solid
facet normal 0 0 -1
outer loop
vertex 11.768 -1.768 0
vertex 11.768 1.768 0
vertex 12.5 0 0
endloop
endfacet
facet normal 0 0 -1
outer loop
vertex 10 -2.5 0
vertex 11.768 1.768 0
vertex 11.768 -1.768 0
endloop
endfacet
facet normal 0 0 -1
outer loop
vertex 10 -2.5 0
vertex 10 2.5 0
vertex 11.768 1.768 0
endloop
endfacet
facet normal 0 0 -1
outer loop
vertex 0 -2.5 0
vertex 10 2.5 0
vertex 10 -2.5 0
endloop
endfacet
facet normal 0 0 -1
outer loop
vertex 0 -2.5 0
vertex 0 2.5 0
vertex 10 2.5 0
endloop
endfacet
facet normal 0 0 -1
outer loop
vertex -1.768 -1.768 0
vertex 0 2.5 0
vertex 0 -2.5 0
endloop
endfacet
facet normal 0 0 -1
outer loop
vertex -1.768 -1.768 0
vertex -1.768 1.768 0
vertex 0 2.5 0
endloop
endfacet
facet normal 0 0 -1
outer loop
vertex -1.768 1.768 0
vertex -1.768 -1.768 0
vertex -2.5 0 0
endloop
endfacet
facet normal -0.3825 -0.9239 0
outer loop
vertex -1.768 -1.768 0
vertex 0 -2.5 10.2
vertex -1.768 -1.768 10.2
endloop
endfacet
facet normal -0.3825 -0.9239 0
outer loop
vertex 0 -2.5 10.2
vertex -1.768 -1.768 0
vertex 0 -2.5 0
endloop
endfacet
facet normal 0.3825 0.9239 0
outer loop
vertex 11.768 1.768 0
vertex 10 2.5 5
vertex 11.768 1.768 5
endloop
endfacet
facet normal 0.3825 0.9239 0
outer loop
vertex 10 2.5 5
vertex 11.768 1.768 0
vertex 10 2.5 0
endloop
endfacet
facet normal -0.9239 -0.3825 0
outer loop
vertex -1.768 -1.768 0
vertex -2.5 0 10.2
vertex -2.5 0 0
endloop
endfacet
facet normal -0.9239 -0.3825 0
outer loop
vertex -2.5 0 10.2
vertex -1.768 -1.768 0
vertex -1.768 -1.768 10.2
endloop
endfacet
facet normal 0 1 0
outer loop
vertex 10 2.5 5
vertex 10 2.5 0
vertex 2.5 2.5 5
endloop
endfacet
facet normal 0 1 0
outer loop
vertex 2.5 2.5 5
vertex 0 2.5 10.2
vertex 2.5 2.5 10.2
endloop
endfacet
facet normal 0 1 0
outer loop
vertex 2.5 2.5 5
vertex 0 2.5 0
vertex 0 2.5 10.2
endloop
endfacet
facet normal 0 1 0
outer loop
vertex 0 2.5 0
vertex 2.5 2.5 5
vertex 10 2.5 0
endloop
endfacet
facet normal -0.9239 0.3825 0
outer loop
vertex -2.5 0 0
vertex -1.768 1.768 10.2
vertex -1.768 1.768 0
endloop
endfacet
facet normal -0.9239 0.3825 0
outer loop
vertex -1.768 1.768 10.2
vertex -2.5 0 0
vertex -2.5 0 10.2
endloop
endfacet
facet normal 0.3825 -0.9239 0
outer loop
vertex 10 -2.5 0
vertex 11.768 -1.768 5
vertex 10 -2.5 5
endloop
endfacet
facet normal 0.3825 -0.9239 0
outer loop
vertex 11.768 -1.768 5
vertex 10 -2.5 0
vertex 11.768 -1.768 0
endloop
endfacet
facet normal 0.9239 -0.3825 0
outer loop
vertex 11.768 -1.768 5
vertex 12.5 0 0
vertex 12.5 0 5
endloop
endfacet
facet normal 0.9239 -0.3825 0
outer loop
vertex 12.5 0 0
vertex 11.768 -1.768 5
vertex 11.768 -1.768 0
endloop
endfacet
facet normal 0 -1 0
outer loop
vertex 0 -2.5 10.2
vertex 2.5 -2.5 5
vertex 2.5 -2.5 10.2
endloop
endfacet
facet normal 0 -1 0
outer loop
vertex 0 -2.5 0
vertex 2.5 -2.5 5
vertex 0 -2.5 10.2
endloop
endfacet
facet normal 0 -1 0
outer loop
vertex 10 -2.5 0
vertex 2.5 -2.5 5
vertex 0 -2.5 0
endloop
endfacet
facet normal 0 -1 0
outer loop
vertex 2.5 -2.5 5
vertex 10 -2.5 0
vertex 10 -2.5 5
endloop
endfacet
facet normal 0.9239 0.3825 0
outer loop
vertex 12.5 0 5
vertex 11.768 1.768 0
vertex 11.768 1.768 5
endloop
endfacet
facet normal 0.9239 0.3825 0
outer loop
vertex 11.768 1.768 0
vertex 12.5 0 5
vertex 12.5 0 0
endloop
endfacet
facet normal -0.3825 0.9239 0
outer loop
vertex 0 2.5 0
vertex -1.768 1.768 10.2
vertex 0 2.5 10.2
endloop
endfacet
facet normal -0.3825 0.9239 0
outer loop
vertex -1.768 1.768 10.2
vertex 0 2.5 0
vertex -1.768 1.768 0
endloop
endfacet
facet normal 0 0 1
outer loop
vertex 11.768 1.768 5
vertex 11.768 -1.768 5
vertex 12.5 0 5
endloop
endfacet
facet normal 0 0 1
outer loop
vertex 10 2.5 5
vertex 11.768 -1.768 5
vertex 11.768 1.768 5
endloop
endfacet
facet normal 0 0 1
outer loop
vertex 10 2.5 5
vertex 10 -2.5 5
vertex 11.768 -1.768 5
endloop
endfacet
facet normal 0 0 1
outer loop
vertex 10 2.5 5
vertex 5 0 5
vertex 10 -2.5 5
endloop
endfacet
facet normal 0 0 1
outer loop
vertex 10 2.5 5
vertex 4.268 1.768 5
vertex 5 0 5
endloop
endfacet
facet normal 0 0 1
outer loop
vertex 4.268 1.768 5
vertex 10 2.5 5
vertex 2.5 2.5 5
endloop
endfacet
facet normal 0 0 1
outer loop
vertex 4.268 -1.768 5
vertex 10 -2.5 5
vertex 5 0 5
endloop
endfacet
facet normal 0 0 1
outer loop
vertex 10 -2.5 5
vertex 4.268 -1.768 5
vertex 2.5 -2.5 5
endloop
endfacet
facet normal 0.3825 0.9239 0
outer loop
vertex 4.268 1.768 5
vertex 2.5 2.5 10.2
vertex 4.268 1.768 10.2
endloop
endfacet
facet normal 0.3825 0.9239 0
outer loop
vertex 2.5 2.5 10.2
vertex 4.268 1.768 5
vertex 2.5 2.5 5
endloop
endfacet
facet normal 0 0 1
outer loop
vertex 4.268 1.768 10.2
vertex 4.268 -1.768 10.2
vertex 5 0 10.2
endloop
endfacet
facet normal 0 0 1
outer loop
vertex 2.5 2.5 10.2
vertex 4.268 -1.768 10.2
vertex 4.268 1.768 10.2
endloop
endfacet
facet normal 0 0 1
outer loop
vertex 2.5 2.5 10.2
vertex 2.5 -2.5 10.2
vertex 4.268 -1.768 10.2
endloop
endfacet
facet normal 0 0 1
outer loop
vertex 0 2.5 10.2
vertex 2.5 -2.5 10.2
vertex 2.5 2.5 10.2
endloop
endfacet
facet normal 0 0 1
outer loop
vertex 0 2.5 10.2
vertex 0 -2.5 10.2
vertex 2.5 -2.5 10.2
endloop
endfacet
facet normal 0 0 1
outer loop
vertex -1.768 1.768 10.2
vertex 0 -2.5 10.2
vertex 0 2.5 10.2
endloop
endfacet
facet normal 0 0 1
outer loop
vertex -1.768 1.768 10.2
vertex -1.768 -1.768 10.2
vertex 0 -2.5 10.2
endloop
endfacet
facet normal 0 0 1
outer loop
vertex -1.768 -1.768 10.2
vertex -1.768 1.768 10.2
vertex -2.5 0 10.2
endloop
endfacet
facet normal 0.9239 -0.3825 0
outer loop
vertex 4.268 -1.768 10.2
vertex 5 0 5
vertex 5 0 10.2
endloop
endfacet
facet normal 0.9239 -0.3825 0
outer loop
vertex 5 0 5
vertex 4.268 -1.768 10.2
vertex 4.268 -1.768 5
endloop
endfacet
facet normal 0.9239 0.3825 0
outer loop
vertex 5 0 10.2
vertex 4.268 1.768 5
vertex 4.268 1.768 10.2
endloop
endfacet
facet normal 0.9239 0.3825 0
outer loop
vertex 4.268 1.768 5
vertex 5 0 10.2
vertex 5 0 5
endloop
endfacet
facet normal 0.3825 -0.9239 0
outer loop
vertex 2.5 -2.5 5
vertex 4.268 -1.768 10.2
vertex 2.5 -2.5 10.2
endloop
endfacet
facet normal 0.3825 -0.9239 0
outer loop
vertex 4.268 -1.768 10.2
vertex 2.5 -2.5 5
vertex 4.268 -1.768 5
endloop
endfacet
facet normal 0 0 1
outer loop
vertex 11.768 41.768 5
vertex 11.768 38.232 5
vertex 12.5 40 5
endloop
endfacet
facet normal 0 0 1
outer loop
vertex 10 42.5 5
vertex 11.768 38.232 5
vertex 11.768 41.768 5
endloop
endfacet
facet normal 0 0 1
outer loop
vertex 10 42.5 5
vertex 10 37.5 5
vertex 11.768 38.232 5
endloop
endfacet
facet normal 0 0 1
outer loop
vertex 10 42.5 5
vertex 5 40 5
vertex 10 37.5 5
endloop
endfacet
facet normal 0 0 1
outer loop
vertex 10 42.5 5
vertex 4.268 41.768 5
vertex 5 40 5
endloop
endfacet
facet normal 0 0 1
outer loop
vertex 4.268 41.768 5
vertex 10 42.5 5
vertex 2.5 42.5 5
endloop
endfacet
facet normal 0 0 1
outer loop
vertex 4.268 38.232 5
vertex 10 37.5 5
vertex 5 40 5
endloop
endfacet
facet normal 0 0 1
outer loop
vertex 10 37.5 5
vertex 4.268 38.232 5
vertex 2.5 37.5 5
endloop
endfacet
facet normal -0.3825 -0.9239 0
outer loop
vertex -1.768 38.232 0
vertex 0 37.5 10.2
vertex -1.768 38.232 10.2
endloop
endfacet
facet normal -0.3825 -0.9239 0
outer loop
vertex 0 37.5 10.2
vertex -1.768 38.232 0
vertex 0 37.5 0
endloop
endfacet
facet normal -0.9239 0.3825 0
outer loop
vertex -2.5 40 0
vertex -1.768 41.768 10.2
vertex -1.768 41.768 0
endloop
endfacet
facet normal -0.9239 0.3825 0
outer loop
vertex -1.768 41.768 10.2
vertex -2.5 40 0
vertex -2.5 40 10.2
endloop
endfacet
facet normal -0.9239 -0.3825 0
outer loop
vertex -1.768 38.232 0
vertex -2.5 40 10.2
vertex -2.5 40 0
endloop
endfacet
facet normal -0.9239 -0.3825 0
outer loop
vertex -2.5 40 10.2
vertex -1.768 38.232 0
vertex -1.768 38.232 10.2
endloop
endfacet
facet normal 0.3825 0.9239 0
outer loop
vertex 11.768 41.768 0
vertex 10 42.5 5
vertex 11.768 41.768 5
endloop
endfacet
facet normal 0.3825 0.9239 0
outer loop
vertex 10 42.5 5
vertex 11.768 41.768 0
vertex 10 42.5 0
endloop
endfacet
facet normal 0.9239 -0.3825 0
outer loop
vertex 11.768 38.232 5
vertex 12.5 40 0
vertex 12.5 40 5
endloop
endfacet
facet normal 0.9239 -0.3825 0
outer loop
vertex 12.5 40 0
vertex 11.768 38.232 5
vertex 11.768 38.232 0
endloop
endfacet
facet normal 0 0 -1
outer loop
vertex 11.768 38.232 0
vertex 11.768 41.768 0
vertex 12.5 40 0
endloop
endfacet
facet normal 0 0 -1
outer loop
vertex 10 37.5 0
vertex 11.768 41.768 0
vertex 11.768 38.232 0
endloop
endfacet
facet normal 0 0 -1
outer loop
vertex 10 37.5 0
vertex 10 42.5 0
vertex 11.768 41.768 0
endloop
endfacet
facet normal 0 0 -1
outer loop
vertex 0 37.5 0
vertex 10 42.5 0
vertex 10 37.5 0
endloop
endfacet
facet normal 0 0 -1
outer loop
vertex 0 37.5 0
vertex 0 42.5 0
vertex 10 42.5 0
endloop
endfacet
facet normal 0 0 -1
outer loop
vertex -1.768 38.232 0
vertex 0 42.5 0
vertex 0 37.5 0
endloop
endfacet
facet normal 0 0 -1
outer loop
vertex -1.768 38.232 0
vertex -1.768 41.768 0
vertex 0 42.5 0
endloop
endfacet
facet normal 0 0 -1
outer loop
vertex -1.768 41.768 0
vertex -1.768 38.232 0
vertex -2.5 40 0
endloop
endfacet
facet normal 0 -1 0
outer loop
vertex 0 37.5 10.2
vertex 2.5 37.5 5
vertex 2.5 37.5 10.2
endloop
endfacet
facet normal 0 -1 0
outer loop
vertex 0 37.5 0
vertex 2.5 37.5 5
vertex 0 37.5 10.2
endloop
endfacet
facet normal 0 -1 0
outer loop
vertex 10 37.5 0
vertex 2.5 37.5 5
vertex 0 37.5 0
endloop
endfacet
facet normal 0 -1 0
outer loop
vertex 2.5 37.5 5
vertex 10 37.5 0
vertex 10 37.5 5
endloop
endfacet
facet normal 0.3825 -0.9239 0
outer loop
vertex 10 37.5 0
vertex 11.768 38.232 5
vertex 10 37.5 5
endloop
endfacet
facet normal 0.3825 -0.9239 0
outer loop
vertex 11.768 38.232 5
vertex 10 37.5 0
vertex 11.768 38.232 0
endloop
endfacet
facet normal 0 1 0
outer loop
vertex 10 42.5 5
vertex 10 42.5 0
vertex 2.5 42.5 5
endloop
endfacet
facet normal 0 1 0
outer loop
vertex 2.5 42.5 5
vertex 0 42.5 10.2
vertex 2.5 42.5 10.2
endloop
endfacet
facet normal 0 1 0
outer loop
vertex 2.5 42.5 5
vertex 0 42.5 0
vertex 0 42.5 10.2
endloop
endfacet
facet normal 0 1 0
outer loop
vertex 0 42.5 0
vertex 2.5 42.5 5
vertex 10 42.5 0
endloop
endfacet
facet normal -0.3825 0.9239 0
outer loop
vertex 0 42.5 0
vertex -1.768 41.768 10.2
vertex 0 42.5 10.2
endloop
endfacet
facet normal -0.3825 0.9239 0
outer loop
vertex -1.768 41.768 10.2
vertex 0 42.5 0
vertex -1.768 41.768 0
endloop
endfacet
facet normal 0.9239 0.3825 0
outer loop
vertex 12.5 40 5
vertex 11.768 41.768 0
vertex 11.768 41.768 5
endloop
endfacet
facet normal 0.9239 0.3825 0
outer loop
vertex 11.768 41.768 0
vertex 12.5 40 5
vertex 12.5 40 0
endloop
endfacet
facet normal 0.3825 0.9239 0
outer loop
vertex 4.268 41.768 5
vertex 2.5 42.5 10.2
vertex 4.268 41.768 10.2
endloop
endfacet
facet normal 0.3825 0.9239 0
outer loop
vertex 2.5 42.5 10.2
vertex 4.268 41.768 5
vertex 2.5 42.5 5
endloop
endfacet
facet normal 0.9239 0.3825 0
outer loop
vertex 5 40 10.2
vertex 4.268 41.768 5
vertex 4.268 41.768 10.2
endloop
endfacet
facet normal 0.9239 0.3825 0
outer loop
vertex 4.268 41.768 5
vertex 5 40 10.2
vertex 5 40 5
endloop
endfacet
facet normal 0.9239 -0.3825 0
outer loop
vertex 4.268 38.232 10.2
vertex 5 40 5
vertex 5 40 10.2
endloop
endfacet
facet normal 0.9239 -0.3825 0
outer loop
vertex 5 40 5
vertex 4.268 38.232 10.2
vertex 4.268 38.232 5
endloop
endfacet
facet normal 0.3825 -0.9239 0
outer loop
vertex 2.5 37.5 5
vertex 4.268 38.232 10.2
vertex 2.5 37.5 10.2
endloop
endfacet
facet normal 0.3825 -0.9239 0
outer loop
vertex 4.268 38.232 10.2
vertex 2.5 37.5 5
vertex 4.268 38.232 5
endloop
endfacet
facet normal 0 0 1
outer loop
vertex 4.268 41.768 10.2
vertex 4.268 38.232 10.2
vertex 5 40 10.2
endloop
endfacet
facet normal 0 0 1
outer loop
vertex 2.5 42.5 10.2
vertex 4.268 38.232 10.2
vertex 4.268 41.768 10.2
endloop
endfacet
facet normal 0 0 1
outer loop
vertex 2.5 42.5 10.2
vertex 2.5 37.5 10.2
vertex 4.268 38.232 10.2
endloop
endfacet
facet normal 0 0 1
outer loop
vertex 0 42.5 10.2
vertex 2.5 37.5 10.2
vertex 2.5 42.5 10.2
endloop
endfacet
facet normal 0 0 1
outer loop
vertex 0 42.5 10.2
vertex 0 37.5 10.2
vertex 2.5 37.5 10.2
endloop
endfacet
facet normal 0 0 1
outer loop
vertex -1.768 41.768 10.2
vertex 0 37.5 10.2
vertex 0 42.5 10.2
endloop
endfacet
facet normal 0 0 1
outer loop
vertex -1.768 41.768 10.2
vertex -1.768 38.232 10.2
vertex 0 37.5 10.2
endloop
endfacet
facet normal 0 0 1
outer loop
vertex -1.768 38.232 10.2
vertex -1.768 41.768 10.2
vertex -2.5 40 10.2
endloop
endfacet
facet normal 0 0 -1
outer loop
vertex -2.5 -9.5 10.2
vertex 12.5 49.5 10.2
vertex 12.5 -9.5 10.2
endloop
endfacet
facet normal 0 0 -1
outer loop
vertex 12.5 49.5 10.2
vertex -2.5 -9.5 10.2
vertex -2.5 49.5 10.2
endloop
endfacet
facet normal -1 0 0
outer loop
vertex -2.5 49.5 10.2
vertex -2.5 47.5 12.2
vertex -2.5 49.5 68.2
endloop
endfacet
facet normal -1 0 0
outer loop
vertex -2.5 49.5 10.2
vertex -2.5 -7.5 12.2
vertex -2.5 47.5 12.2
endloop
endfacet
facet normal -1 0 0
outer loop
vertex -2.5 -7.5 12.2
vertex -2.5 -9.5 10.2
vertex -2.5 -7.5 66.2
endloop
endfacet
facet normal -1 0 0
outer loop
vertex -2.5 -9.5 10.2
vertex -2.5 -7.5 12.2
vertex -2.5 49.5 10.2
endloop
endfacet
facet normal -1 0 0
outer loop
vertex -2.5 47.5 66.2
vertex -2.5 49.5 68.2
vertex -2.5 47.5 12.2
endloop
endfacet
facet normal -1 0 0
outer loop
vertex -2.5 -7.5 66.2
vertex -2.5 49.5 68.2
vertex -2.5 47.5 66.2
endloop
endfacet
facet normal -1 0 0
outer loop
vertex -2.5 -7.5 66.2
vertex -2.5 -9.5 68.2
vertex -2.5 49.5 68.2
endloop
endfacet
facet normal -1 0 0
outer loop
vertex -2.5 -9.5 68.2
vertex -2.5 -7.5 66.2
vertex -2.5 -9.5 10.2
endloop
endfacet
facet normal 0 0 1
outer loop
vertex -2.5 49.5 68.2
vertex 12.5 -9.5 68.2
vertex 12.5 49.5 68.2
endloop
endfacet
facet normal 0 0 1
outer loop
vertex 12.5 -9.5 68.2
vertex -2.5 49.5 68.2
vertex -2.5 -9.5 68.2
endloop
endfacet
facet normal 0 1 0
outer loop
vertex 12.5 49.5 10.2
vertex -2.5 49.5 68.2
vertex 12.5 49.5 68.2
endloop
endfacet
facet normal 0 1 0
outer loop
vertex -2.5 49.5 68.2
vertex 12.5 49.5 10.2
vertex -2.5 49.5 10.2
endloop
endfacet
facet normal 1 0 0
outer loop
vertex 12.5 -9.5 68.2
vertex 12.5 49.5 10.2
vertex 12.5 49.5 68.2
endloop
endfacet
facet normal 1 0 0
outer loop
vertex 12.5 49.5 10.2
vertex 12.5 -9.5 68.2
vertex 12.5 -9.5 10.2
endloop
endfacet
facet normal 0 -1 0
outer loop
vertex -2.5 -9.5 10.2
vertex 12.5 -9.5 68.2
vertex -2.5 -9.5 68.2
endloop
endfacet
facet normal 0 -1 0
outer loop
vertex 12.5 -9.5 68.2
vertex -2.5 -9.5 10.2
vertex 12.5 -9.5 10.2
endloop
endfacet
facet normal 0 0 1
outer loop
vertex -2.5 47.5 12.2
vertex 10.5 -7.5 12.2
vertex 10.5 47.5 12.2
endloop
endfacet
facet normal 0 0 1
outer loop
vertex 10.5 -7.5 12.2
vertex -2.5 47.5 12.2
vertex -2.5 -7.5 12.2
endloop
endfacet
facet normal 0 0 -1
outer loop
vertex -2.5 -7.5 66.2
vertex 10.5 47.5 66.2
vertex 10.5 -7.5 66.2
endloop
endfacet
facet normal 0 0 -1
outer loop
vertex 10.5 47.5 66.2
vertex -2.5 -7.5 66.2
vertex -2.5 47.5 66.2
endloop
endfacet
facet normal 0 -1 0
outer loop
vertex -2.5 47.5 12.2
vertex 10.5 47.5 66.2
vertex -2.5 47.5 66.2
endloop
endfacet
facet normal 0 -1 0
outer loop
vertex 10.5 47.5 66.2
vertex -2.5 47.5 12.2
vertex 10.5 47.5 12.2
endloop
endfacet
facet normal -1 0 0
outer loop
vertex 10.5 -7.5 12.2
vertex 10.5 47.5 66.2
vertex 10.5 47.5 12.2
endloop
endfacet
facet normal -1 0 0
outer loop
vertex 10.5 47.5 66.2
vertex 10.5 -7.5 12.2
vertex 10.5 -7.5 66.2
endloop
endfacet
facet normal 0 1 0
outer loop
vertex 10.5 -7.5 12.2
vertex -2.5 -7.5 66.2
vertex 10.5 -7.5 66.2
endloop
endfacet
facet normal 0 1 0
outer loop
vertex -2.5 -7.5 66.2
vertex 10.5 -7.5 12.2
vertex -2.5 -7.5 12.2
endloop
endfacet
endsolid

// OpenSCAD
// --------------------------------------------------------------
//  Author: Angel Roman
//  GitHub: https://github.com/legna-namor
//  Purpose: This project generates a custom IKEA Skadis pegboard mount using OpenSCAD, allowing users to adjust dimensions based on their needs. 
// --------------------------------------------------------------
// Variables, width (45-231), depth (1-230)
width = 55;
depth = 53;
// Function to adjust width to be between 45 and 235
function adjust_width(w) = w < 45 ? 45 : (w > 235 ? 235 : w);
// Function to adjust depth to be between 6 and 235
function adjust_depth(d) = d < 6 ? 6 : (d > 235 ? 235 : d);
// Function to calculate half of the remainder when adjusted width is divided by 40
function half_remainder(w) = 
    (adjust_width(w) == 45 || 
     adjust_width(w) == 85 || 
     adjust_width(w) == 125 || 
     adjust_width(w) == 165 || 
     adjust_width(w) == 205) ? 0 : (adjust_width(w) % 40) / 2;   
// Adjusted variable call outs
adjusted_width = adjust_width(width+4);
adjusted_depth = adjust_depth(depth+5);
half_rem = half_remainder(width+4);
// --------------------------------------------------------------
// Peg module
module peg(height, width, length) {
    linear_extrude(height) {
        hull() {
            translate([length - width, 0, 0]) circle(d = width);
            circle(d = width);
        }
    }
}
// Peg generator module to generate pegs based on adjusted width
module peg_generator(w) {
    num_pegs = floor(w / 40);
    for (i = [0:num_pegs]) {
        n = i * 40;
        translate([0, n, 0]) peg(5, 5, 15);
        translate([0, n, 5]) peg(5.2, 5, 7.5);
    }
}
// --------------------------------------------------------------
// mount module
module mount(w, r, d) {
    translate([-2.5, (r == 0) ? -2.5 : -r, 10.2])
    difference() {
        linear_extrude(d) {
            square([15, w]);
        }
        translate([-2, 2, 2])
        linear_extrude(d-4) {
            square([15, w-4]);
        }
    }
}
// --------------------------------------------------------------
// Generates skadis mount
peg_generator(adjusted_width);
mount(adjusted_width, half_rem, adjusted_depth);
